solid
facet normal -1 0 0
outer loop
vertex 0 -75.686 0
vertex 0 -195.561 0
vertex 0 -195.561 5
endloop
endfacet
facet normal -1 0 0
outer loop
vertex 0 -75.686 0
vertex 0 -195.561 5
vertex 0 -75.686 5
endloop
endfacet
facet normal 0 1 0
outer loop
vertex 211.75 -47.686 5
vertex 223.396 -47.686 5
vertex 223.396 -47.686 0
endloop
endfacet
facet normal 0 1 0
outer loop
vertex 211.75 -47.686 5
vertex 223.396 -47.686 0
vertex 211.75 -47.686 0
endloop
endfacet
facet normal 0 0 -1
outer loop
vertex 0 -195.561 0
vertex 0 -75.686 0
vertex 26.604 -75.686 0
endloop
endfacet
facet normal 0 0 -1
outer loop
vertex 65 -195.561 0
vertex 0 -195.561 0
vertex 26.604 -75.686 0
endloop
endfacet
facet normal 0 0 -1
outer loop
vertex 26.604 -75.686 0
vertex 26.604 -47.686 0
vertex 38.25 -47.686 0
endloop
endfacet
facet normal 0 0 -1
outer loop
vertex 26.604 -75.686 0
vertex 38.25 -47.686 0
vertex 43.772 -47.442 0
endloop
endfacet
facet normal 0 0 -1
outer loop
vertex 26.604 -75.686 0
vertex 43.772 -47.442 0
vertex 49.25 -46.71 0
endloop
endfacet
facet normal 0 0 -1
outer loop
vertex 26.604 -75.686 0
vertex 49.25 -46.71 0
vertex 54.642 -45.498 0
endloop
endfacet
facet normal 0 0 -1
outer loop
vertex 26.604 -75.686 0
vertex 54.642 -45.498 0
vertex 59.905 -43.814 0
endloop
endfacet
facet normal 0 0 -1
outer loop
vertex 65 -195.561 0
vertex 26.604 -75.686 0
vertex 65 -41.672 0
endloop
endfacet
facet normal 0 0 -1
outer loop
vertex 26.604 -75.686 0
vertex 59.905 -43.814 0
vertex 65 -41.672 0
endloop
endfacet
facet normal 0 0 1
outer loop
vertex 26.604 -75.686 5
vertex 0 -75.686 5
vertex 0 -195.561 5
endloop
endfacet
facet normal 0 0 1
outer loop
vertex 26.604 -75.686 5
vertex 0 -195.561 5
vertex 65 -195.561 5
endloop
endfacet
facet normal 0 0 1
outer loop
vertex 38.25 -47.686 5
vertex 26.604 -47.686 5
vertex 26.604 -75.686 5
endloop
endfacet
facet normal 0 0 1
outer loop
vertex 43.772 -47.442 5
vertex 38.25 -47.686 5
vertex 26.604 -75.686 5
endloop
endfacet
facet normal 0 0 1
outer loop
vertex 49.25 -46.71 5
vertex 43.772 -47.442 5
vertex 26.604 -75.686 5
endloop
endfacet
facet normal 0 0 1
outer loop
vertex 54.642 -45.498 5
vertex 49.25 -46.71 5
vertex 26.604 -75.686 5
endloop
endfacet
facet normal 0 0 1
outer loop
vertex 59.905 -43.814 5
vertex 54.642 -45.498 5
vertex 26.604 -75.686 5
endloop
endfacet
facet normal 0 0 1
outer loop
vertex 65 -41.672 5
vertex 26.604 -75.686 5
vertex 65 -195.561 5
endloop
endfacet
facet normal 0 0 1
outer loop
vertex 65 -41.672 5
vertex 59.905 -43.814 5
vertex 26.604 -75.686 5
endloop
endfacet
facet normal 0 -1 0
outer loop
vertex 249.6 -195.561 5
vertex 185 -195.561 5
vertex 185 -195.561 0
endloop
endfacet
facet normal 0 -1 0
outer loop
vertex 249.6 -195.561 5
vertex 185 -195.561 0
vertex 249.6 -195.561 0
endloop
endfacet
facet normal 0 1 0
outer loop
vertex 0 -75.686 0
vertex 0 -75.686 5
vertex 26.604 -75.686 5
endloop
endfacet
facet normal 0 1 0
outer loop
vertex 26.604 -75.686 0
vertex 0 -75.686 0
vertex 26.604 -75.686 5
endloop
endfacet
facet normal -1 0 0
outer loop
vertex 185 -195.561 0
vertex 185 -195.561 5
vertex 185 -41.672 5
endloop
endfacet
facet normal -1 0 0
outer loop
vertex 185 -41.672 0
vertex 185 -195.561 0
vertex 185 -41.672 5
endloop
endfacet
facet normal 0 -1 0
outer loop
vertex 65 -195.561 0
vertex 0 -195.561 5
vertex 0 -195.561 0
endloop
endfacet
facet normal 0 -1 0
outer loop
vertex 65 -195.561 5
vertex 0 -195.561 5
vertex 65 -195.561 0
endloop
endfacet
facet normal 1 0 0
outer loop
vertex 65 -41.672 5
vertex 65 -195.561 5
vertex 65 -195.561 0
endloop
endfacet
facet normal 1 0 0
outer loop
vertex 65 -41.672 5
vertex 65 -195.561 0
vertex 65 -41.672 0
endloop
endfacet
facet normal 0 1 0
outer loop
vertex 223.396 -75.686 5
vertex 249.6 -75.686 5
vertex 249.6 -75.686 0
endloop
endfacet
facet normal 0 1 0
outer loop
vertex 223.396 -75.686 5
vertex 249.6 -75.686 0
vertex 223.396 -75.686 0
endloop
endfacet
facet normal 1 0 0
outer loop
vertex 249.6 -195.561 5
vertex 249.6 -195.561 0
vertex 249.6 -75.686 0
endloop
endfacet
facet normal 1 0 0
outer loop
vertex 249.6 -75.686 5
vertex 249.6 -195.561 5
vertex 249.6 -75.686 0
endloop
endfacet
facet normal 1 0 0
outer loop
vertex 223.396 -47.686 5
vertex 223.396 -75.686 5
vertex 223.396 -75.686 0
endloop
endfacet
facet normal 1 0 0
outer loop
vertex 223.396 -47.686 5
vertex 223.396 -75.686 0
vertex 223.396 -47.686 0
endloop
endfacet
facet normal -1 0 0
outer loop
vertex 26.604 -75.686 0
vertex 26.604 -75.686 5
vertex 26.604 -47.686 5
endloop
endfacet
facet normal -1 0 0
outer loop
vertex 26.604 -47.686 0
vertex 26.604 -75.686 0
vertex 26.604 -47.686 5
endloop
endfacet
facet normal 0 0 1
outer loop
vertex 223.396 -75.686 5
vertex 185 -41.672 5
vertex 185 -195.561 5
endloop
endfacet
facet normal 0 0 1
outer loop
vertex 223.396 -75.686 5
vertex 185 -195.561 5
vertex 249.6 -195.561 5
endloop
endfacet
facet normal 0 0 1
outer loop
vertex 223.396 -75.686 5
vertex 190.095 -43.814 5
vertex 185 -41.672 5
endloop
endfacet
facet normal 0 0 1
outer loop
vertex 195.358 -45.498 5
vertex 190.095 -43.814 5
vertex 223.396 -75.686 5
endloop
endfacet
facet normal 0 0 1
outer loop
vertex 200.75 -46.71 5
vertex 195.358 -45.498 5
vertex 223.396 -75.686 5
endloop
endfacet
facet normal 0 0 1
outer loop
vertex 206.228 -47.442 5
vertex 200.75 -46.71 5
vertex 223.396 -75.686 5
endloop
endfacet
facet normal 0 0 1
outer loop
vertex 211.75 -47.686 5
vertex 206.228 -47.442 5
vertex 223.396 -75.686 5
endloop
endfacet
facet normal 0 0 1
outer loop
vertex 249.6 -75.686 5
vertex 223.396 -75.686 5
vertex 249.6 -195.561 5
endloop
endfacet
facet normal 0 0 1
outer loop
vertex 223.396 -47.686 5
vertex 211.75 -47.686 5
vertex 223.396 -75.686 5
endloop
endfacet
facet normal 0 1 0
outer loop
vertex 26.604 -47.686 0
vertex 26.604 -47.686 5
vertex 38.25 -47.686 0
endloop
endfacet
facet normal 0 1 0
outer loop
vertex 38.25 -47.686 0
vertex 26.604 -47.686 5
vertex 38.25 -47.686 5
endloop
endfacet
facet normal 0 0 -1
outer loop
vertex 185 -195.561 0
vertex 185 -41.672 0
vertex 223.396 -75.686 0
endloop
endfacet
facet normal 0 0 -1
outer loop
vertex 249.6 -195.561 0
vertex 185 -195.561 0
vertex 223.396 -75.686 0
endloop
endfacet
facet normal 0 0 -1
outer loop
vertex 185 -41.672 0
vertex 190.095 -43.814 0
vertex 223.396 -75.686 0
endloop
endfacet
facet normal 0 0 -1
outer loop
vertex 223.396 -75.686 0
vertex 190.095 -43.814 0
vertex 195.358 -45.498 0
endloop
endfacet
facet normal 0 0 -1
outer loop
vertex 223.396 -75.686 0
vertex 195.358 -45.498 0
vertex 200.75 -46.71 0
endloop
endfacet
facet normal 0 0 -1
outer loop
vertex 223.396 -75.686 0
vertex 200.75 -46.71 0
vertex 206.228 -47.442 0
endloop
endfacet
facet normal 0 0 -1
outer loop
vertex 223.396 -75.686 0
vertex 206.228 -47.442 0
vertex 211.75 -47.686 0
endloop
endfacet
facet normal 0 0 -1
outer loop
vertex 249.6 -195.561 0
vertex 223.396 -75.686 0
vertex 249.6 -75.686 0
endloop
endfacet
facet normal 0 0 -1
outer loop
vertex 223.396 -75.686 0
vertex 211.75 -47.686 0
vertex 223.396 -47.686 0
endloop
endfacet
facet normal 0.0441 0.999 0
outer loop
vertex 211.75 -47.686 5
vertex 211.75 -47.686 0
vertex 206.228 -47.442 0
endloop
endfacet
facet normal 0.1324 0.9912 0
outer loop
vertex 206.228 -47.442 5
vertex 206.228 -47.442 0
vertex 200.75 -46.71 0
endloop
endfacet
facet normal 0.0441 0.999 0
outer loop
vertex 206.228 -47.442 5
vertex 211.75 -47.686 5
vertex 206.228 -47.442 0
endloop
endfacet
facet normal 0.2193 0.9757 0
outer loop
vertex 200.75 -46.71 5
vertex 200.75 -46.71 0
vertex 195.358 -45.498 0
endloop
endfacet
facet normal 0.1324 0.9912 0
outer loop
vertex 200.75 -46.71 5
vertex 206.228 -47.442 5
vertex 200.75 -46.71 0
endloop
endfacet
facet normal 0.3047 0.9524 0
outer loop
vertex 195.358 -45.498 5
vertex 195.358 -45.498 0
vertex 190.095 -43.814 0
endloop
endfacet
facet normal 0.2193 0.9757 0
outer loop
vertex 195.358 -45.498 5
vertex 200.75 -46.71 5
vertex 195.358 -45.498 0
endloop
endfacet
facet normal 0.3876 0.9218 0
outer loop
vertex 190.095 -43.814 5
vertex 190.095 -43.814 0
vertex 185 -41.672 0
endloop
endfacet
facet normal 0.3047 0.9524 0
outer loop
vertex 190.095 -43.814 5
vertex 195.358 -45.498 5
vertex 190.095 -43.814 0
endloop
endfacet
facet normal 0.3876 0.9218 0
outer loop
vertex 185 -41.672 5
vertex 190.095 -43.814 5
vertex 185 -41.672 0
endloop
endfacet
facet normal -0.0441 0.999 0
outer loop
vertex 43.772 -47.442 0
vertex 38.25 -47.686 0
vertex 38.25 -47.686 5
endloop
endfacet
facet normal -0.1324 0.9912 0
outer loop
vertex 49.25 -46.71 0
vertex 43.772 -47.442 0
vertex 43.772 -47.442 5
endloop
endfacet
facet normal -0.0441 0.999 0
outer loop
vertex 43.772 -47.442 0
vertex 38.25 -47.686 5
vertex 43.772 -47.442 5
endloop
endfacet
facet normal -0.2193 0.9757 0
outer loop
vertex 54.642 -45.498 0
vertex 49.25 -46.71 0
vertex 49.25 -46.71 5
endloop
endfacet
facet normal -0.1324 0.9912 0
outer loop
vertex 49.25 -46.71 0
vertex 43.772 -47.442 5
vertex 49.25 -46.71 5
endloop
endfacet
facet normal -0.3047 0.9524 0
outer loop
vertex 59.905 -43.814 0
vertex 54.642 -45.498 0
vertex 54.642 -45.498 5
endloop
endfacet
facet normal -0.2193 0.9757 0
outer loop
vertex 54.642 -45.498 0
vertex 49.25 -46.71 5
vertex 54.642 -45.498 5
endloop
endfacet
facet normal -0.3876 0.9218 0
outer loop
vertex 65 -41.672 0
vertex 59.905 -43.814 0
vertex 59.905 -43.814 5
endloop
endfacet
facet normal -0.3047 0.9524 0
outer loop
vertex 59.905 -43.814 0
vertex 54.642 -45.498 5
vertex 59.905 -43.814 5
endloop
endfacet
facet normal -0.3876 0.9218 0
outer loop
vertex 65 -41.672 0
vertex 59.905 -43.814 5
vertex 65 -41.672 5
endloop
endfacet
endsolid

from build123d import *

# Parameters (mm, degrees)
SKETCH1_W           = 249.6
SKETCH1_H           = 267.4
BOSS_EXTRUDE1_DEPTH = 5
SKETCH5_W           = 249.6
SKETCH5_H           = 71.838779628
CUT_EXTRUDE3_DEPTH  = 6
SKETCH7_W           = 120
SKETCH7_H           = 195.561220372
CUT_EXTRUDE4_DEPTH  = 6


with BuildPart() as part:
    # Sketch1 → Boss-Extrude1 (new body)
    with BuildSketch(Plane.XY):
        with Locations((124.8, -133.7)):
            Rectangle(SKETCH1_W, SKETCH1_H)
    extrude(amount=BOSS_EXTRUDE1_DEPTH)

    # Sketch5 → Cut-Extrude3 (cut, through all)
    with BuildSketch(Plane.XY.offset(5)):
        with Locations((124.8, -231.480610186)):
            Rectangle(SKETCH5_W, SKETCH5_H)
        with BuildLine():
            Line((151.030648939, 0), (249.6, 0))
            Line((249.6, 0), (249.6, -75.685882669))
            Line((249.6, -75.685882669), (223.395661642, -75.685882669))
            Line((223.395661642, -75.685882669), (223.395661642, -47.685882669))
            Line((223.395661642, -47.685882669), (211.749607492, -47.685882669))
            ThreePointArc((211.749607492, -47.685882669), (173.146708204, -34.339378644), (151.030648939, 0))
        make_face()
        with BuildLine():
            Line((98.969351061, 0), (0, 0))
            Line((0, 0), (0, -75.685882669))
            Line((0, -75.685882669), (26.604338358, -75.685882669))
            Line((26.604338358, -75.685882669), (26.604338358, -47.685882669))
            Line((26.604338358, -47.685882669), (38.250392508, -47.685882669))
            ThreePointArc((38.250392508, -47.685882669), (76.853291796, -34.339378644), (98.969351061, 0))
        make_face()
    extrude(amount=-CUT_EXTRUDE3_DEPTH, mode=Mode.SUBTRACT)

    # Sketch7 → Cut-Extrude4 (cut, through all)
    with BuildSketch(Plane.XY.offset(5)):
        with Locations((125, -97.780610186)):
            Rectangle(SKETCH7_W, SKETCH7_H)
    extrude(amount=-CUT_EXTRUDE4_DEPTH, mode=Mode.SUBTRACT)


solid = part.part
